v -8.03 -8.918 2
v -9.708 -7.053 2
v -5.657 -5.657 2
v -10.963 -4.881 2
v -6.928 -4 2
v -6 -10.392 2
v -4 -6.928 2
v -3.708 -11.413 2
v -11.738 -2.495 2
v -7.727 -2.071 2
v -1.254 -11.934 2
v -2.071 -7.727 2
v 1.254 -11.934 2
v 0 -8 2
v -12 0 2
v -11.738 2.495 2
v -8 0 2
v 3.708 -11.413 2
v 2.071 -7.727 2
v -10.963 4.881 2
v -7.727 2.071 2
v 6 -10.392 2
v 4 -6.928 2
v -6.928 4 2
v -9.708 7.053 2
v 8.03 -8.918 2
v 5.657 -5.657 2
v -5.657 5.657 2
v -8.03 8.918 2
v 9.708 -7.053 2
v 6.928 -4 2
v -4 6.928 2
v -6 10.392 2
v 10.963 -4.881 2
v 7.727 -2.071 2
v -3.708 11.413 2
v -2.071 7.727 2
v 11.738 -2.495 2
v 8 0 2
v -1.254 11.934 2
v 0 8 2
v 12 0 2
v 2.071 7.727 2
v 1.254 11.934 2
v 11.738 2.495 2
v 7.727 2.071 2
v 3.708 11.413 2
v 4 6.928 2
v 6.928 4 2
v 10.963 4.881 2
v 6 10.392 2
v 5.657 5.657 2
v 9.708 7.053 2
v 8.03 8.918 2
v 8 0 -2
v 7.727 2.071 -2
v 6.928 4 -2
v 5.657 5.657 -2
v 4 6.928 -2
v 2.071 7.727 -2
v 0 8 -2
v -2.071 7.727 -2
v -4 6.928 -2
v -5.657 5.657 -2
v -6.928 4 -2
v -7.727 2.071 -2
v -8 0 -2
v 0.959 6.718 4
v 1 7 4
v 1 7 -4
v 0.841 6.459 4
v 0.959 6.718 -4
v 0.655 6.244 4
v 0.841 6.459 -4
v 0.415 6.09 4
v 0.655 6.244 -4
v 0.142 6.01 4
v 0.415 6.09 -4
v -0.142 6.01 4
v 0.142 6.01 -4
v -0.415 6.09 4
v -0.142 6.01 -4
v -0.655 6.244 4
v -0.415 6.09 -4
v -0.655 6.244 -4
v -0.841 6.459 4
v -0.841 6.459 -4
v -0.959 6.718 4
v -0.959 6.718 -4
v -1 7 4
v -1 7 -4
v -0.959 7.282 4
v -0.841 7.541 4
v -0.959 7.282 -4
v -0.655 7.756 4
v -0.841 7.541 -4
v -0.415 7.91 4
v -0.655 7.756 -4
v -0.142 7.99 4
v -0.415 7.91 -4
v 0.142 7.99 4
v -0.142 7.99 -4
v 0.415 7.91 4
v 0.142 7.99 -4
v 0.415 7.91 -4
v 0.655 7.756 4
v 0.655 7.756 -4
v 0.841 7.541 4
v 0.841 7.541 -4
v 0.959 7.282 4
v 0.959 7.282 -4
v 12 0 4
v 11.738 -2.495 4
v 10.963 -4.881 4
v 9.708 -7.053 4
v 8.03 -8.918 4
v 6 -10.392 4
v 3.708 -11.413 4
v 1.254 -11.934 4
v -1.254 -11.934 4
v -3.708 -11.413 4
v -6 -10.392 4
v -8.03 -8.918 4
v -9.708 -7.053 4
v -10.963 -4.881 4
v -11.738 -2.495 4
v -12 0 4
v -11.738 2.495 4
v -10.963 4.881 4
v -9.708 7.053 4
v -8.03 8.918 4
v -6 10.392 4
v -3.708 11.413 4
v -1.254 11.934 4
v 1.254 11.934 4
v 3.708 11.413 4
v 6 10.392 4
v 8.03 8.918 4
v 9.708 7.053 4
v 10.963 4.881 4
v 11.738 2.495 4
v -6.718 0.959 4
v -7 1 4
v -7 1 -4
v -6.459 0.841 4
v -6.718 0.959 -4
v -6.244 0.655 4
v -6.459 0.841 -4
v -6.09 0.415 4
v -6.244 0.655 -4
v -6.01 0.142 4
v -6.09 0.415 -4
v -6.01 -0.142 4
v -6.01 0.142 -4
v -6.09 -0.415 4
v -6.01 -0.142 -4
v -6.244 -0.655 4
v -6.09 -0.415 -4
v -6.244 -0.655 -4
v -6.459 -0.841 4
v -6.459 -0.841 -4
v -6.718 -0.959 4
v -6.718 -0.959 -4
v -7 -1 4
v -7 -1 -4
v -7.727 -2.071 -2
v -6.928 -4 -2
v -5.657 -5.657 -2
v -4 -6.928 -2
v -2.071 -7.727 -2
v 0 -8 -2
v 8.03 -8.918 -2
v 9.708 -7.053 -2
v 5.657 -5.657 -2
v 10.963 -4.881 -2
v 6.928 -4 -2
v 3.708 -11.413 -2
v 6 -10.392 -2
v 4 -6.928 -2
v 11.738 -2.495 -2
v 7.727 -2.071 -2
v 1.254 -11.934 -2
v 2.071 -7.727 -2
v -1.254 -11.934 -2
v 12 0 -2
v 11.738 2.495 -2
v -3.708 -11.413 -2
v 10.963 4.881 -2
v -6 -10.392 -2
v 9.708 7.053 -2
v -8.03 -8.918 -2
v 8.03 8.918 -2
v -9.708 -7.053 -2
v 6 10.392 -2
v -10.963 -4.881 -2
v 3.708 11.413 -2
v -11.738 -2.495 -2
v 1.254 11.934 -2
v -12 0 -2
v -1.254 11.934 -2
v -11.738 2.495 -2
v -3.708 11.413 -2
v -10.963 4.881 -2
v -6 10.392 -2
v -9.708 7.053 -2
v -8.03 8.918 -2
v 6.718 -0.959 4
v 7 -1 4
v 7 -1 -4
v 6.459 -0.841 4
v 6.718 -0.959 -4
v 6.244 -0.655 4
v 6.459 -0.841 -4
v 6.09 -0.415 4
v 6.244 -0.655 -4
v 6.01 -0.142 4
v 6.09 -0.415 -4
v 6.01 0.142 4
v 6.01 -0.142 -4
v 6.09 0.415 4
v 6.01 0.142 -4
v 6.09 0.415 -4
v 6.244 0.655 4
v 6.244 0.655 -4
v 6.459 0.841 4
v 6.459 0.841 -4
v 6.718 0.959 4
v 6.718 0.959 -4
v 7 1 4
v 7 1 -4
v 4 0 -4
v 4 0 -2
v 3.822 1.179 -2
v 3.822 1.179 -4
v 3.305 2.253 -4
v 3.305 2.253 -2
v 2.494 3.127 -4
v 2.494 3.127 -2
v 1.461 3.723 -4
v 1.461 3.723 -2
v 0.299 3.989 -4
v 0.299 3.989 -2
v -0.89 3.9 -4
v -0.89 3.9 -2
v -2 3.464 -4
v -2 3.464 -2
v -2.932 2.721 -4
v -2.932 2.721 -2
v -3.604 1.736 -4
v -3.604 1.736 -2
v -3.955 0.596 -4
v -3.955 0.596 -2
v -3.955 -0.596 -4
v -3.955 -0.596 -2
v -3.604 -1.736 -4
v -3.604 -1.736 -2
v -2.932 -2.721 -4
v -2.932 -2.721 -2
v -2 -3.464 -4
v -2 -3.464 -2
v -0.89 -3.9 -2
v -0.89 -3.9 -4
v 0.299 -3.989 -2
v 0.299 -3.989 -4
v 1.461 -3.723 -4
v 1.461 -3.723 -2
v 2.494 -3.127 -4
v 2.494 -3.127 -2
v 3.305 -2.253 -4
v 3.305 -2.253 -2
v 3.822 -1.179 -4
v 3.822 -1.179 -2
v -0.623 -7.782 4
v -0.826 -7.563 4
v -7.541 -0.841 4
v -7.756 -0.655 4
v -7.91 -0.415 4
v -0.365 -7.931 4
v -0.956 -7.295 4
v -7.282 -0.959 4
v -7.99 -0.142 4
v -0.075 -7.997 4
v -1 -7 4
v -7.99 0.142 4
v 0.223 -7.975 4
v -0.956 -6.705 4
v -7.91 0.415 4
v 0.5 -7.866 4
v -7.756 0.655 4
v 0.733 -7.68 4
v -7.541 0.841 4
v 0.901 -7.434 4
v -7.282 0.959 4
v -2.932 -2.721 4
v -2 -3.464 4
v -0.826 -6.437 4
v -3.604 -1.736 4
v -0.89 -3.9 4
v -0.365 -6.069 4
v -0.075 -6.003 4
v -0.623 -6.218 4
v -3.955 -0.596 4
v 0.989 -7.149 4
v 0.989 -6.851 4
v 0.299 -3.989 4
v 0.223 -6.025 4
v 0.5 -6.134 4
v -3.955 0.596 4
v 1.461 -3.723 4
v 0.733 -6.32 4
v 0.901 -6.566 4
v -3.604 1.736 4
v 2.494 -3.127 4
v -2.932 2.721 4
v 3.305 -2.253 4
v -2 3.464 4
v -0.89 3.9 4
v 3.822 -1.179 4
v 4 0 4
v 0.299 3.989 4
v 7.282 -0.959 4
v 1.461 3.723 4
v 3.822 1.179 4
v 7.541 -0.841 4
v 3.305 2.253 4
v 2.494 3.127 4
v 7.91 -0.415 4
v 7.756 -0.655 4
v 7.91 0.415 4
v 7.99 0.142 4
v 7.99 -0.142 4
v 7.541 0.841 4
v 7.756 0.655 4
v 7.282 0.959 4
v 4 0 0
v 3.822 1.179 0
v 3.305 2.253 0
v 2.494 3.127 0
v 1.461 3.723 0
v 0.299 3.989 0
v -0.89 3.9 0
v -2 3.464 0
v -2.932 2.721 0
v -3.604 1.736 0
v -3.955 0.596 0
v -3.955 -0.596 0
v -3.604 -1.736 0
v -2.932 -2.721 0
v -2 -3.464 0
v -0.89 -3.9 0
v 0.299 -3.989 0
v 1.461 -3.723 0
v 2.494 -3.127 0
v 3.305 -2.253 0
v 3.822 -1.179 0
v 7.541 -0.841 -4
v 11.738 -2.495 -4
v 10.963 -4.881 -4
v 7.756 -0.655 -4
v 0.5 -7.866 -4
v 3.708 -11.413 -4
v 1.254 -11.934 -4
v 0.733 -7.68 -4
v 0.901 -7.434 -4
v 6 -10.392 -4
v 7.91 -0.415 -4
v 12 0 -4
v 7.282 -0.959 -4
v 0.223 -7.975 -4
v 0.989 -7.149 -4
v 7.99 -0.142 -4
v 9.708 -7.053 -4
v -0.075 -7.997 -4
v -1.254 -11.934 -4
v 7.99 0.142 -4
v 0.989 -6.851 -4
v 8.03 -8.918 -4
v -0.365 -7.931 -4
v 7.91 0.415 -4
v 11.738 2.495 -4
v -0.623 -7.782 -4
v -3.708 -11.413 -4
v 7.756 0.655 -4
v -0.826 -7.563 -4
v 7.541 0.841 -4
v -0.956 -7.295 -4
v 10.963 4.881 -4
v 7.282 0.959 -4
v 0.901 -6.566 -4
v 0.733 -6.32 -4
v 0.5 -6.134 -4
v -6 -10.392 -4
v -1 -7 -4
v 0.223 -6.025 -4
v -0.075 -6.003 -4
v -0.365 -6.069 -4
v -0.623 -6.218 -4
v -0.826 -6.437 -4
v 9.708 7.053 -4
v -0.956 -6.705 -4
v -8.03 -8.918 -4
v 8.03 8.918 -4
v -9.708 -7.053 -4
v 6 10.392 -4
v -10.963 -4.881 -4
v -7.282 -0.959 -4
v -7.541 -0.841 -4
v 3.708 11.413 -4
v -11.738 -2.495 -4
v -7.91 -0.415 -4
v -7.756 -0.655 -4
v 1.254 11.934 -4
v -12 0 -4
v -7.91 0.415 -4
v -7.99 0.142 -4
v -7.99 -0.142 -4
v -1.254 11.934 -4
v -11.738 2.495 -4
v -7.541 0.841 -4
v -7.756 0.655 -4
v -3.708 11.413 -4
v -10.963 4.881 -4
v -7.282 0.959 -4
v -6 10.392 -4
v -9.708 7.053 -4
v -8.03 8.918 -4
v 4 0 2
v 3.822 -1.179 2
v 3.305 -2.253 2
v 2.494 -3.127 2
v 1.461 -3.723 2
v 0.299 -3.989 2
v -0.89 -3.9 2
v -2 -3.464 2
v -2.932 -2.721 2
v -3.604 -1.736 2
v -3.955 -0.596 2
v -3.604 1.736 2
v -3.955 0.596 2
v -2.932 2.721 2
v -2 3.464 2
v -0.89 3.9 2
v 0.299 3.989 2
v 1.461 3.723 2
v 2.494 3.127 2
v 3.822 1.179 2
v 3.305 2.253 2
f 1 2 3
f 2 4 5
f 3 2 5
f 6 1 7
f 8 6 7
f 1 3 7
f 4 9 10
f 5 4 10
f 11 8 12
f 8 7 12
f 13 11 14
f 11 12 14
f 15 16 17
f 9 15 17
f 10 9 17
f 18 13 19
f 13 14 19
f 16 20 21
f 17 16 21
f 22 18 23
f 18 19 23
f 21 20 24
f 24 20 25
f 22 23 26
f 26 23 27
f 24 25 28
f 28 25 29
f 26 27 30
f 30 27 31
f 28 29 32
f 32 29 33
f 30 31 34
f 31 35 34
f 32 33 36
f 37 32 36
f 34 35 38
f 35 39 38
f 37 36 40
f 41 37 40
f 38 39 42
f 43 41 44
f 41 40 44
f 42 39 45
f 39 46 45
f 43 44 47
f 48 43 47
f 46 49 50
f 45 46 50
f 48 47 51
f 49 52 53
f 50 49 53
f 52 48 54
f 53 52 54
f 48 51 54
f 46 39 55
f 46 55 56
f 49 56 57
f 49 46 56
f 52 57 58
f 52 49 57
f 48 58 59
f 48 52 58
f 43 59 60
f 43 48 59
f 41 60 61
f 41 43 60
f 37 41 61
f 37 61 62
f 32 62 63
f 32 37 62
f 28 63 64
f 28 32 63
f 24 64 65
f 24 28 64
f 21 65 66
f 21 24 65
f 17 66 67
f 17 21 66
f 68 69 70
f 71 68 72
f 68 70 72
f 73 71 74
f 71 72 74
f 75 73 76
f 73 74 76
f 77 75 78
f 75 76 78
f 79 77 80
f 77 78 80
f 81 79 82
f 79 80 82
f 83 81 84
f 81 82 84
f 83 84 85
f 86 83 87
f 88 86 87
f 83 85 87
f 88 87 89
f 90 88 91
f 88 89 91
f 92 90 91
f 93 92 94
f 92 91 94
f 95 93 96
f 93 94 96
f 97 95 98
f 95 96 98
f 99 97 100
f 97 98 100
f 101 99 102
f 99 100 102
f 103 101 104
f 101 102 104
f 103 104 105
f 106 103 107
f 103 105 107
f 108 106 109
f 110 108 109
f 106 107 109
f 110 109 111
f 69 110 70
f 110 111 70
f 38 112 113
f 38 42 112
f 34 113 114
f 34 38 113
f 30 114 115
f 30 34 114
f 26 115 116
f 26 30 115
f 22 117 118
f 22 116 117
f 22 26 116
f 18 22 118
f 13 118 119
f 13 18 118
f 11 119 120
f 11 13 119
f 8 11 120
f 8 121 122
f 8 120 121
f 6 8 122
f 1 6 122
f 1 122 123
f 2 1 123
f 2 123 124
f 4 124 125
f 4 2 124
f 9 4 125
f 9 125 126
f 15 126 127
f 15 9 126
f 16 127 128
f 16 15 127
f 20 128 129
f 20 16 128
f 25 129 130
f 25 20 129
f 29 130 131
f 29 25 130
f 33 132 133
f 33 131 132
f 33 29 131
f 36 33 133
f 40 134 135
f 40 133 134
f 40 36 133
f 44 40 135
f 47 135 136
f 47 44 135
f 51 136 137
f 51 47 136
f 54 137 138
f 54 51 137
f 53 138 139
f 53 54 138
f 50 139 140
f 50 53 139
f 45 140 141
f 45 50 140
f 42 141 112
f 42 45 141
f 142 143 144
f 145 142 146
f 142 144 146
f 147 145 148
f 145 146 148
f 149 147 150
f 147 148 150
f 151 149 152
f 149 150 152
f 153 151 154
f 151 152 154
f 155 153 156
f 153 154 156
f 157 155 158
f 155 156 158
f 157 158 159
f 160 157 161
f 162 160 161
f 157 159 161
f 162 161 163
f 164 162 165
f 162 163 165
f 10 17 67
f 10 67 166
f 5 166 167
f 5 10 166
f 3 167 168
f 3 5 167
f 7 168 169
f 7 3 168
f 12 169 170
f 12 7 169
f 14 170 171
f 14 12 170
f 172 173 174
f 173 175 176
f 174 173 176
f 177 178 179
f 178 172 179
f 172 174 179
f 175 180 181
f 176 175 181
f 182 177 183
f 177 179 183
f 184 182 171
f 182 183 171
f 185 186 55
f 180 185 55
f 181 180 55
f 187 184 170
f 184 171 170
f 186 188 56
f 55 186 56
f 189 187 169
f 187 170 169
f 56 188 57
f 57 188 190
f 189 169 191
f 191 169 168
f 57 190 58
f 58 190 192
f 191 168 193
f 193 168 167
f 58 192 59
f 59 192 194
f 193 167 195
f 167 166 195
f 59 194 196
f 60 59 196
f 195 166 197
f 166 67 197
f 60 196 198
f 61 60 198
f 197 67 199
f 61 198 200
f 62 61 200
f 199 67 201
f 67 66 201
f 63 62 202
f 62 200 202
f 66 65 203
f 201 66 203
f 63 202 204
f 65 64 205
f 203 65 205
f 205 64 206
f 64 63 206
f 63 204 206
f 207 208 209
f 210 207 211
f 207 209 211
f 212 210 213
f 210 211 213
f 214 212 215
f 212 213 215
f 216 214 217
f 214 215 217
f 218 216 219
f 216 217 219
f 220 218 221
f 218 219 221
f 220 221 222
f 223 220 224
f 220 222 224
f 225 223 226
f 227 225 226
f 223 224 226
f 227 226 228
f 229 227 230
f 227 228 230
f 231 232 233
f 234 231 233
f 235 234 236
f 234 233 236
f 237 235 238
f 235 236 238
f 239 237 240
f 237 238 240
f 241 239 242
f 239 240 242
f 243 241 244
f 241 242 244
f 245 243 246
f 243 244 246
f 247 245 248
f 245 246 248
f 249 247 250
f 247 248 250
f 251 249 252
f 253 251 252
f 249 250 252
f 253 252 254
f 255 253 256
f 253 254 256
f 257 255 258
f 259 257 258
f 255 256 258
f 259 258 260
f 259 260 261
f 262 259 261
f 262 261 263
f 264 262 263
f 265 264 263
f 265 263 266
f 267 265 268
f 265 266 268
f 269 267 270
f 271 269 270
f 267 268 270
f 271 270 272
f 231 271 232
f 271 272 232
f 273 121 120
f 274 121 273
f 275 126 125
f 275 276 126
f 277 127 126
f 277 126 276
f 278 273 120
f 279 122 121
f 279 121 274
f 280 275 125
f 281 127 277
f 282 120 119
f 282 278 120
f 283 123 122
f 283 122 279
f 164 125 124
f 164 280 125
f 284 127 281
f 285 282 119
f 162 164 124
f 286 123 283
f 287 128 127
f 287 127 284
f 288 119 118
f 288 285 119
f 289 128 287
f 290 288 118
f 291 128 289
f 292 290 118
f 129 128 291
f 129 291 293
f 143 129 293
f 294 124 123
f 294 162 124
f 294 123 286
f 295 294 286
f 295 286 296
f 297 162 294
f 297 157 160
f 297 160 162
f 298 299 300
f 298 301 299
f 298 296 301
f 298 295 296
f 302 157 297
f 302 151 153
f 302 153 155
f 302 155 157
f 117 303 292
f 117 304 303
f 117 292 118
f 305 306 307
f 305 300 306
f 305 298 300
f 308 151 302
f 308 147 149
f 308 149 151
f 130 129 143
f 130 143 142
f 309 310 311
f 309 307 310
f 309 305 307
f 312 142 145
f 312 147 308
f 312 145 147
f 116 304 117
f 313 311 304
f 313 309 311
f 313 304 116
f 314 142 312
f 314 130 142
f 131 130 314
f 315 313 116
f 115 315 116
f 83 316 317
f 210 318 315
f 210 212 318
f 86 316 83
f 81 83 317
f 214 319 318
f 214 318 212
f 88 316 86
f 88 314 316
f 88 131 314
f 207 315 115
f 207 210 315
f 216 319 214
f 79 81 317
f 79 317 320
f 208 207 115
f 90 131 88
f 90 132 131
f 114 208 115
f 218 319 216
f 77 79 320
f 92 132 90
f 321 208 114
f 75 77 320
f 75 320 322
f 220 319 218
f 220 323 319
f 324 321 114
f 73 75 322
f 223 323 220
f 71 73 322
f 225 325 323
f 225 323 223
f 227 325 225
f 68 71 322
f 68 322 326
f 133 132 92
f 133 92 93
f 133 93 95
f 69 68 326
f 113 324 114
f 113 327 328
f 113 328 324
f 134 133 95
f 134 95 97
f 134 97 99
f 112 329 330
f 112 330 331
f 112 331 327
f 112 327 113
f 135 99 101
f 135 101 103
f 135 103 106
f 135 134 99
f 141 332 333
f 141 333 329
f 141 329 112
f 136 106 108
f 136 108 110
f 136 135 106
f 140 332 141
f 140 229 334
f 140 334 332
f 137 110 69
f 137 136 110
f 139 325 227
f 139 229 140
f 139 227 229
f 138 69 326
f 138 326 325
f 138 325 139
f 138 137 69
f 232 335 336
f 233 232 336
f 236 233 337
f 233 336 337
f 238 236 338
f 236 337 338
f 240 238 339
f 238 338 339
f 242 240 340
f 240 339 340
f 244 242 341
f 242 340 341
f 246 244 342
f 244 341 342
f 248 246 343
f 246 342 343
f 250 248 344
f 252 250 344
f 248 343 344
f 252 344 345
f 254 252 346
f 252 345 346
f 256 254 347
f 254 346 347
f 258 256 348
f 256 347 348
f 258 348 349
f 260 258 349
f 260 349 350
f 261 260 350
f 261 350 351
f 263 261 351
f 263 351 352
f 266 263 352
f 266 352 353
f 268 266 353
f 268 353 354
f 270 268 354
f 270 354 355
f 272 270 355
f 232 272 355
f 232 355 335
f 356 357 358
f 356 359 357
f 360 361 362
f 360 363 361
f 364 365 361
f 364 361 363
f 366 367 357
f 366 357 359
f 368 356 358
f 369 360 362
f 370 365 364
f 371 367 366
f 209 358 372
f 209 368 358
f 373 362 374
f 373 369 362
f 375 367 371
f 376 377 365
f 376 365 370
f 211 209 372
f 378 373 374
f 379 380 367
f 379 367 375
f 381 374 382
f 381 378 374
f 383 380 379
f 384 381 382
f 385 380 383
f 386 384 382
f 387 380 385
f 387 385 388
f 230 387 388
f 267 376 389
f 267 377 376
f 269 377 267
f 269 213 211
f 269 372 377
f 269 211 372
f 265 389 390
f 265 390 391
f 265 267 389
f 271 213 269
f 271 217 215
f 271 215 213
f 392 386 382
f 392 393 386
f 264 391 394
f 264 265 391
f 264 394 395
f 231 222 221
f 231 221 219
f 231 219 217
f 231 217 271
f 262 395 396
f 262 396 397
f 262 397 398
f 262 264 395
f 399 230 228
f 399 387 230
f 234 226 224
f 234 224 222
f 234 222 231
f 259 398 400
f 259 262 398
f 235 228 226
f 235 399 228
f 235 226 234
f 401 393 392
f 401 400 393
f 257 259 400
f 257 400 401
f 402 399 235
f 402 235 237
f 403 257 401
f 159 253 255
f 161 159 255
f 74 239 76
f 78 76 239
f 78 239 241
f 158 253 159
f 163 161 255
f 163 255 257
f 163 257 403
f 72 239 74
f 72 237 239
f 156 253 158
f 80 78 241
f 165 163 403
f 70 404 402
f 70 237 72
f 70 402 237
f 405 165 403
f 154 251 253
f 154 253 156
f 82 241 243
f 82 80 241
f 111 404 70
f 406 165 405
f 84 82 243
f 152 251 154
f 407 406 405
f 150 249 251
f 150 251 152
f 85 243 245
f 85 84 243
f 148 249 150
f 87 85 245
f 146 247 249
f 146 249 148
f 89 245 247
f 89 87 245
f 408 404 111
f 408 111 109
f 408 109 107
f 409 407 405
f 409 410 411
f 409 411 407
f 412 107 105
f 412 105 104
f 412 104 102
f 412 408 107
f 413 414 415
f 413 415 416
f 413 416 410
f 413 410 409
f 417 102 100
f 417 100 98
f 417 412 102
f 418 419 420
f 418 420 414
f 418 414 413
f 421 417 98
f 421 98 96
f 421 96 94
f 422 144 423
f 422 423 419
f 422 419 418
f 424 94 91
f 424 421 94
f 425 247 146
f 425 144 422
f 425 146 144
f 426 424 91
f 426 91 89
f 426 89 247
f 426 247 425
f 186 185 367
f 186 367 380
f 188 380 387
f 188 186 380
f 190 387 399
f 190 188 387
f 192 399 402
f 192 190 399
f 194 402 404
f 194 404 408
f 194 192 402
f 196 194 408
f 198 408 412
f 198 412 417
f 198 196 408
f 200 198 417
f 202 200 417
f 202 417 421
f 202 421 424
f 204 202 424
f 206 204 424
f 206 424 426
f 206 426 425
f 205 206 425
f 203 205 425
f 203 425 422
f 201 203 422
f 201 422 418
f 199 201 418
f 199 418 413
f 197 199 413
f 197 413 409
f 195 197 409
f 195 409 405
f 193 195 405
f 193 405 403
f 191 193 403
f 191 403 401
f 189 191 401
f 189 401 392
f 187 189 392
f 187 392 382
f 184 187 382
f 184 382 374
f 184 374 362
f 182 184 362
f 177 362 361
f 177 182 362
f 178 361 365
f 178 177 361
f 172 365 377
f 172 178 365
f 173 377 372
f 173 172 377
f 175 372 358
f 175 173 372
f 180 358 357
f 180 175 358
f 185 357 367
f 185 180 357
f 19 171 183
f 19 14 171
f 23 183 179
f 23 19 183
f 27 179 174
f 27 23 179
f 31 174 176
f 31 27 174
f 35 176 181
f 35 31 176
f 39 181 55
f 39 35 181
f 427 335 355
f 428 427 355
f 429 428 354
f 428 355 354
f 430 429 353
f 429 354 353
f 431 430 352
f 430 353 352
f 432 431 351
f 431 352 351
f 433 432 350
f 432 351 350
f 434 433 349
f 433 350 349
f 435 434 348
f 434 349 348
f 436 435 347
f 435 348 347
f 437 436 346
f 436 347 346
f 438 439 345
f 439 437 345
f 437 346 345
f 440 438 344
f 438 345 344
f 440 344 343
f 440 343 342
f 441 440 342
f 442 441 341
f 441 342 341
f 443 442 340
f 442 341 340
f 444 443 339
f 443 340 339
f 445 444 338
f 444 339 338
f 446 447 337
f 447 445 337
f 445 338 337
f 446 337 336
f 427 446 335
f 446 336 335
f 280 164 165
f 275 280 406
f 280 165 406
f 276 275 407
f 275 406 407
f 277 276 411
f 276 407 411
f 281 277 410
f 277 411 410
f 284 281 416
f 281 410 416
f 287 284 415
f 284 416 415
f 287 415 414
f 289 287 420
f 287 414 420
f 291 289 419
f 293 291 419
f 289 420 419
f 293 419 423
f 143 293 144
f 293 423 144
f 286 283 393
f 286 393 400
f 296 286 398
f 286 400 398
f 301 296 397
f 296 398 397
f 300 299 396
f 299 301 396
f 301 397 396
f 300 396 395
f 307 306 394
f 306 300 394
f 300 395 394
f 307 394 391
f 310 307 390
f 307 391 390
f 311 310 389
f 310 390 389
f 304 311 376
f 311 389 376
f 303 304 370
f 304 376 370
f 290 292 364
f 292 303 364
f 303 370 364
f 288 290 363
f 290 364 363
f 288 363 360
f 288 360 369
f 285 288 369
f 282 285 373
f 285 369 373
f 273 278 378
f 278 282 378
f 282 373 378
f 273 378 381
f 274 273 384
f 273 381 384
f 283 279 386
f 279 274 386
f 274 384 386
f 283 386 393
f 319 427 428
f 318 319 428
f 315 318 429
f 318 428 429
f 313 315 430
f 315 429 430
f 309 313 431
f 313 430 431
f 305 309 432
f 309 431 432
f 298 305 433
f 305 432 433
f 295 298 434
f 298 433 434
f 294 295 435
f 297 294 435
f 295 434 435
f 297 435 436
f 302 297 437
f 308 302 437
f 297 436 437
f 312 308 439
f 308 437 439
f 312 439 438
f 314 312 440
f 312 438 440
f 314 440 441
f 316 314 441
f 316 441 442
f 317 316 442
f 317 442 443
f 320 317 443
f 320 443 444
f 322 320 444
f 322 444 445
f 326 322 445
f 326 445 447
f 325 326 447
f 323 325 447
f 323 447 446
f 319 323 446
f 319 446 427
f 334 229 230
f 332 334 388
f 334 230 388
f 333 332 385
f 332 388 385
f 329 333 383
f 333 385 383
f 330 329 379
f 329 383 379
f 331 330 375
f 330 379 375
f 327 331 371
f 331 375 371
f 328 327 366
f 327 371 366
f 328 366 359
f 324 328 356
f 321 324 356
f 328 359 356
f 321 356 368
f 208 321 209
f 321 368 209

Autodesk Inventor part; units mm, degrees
ref_plane "YZ Plane" through (0, 0, 0) normal (1, 0, 0) x (0, 1, 0)
ref_plane "XZ Plane" through (0, 0, 0) normal (0, 1, 0) x (-1, 0, 0)
ref_plane "XY Plane" through (0, 0, 0) normal (0, 0, 1) x (1, 0, 0)
sketch "Sketch1" plane through (0, 0, 0) normal (0, 0, 1) x (1, 0, 0)
  circle A0 centre (0, 0) radius 4
  circle A1 centre (0, 0) radius 8
  circle A2 centre (0, 0) radius 12
  dimension "d0" = 8
  dimension "d1" = 16
  dimension "d2" = 24
extrude "Extrusion1" add sketch "Sketch1" along normal mid plane 4 contours A1
sketch "Sketch2" plane through (0, 0, 2) normal (0, 0, 1) x (1, 0, 0)
  circle A0 centre (0, 0) radius 12 projected
  circle A1 centre (0, 0) radius 8 projected
extrude "Extrusion2" add sketch "Sketch2" along normal blind 2 contours A0 | A1
mirror "Mirror1" about plane through (0, 0, 0) normal (0, 0, 1) of "Extrusion2"
extrude "Extrusion3" cut sketch "Sketch1" along normal through all both and the other way through all contours A0
sketch "Sketch3" plane through (0, 0, -4) normal (0, 0, -1) x (-1, 0, 0)
  circle A0 centre (0, 0) radius 7
  line L0 (0, -7) -> (0, 7)
  circle A1 centre (0, -7) radius 1
  circle A2 centre (0, 7) radius 1
  dimension "d9" = 14
  dimension "d10" = 2
  dimension "d11" = 2
extrude "Extrusion4" cut sketch "Sketch3" against normal through all contours A2 L0 A0 | A0 A2 | A1 A0 | A0 L0 A1 | L0 A2 A0 | A0 A1 L0
pattern_circular "Circular Pattern1" count 4 over 360 about axis through (0, 0, -10) along (0, 0, 1) of "Extrusion4"
properties part number "Servo Pulley"
